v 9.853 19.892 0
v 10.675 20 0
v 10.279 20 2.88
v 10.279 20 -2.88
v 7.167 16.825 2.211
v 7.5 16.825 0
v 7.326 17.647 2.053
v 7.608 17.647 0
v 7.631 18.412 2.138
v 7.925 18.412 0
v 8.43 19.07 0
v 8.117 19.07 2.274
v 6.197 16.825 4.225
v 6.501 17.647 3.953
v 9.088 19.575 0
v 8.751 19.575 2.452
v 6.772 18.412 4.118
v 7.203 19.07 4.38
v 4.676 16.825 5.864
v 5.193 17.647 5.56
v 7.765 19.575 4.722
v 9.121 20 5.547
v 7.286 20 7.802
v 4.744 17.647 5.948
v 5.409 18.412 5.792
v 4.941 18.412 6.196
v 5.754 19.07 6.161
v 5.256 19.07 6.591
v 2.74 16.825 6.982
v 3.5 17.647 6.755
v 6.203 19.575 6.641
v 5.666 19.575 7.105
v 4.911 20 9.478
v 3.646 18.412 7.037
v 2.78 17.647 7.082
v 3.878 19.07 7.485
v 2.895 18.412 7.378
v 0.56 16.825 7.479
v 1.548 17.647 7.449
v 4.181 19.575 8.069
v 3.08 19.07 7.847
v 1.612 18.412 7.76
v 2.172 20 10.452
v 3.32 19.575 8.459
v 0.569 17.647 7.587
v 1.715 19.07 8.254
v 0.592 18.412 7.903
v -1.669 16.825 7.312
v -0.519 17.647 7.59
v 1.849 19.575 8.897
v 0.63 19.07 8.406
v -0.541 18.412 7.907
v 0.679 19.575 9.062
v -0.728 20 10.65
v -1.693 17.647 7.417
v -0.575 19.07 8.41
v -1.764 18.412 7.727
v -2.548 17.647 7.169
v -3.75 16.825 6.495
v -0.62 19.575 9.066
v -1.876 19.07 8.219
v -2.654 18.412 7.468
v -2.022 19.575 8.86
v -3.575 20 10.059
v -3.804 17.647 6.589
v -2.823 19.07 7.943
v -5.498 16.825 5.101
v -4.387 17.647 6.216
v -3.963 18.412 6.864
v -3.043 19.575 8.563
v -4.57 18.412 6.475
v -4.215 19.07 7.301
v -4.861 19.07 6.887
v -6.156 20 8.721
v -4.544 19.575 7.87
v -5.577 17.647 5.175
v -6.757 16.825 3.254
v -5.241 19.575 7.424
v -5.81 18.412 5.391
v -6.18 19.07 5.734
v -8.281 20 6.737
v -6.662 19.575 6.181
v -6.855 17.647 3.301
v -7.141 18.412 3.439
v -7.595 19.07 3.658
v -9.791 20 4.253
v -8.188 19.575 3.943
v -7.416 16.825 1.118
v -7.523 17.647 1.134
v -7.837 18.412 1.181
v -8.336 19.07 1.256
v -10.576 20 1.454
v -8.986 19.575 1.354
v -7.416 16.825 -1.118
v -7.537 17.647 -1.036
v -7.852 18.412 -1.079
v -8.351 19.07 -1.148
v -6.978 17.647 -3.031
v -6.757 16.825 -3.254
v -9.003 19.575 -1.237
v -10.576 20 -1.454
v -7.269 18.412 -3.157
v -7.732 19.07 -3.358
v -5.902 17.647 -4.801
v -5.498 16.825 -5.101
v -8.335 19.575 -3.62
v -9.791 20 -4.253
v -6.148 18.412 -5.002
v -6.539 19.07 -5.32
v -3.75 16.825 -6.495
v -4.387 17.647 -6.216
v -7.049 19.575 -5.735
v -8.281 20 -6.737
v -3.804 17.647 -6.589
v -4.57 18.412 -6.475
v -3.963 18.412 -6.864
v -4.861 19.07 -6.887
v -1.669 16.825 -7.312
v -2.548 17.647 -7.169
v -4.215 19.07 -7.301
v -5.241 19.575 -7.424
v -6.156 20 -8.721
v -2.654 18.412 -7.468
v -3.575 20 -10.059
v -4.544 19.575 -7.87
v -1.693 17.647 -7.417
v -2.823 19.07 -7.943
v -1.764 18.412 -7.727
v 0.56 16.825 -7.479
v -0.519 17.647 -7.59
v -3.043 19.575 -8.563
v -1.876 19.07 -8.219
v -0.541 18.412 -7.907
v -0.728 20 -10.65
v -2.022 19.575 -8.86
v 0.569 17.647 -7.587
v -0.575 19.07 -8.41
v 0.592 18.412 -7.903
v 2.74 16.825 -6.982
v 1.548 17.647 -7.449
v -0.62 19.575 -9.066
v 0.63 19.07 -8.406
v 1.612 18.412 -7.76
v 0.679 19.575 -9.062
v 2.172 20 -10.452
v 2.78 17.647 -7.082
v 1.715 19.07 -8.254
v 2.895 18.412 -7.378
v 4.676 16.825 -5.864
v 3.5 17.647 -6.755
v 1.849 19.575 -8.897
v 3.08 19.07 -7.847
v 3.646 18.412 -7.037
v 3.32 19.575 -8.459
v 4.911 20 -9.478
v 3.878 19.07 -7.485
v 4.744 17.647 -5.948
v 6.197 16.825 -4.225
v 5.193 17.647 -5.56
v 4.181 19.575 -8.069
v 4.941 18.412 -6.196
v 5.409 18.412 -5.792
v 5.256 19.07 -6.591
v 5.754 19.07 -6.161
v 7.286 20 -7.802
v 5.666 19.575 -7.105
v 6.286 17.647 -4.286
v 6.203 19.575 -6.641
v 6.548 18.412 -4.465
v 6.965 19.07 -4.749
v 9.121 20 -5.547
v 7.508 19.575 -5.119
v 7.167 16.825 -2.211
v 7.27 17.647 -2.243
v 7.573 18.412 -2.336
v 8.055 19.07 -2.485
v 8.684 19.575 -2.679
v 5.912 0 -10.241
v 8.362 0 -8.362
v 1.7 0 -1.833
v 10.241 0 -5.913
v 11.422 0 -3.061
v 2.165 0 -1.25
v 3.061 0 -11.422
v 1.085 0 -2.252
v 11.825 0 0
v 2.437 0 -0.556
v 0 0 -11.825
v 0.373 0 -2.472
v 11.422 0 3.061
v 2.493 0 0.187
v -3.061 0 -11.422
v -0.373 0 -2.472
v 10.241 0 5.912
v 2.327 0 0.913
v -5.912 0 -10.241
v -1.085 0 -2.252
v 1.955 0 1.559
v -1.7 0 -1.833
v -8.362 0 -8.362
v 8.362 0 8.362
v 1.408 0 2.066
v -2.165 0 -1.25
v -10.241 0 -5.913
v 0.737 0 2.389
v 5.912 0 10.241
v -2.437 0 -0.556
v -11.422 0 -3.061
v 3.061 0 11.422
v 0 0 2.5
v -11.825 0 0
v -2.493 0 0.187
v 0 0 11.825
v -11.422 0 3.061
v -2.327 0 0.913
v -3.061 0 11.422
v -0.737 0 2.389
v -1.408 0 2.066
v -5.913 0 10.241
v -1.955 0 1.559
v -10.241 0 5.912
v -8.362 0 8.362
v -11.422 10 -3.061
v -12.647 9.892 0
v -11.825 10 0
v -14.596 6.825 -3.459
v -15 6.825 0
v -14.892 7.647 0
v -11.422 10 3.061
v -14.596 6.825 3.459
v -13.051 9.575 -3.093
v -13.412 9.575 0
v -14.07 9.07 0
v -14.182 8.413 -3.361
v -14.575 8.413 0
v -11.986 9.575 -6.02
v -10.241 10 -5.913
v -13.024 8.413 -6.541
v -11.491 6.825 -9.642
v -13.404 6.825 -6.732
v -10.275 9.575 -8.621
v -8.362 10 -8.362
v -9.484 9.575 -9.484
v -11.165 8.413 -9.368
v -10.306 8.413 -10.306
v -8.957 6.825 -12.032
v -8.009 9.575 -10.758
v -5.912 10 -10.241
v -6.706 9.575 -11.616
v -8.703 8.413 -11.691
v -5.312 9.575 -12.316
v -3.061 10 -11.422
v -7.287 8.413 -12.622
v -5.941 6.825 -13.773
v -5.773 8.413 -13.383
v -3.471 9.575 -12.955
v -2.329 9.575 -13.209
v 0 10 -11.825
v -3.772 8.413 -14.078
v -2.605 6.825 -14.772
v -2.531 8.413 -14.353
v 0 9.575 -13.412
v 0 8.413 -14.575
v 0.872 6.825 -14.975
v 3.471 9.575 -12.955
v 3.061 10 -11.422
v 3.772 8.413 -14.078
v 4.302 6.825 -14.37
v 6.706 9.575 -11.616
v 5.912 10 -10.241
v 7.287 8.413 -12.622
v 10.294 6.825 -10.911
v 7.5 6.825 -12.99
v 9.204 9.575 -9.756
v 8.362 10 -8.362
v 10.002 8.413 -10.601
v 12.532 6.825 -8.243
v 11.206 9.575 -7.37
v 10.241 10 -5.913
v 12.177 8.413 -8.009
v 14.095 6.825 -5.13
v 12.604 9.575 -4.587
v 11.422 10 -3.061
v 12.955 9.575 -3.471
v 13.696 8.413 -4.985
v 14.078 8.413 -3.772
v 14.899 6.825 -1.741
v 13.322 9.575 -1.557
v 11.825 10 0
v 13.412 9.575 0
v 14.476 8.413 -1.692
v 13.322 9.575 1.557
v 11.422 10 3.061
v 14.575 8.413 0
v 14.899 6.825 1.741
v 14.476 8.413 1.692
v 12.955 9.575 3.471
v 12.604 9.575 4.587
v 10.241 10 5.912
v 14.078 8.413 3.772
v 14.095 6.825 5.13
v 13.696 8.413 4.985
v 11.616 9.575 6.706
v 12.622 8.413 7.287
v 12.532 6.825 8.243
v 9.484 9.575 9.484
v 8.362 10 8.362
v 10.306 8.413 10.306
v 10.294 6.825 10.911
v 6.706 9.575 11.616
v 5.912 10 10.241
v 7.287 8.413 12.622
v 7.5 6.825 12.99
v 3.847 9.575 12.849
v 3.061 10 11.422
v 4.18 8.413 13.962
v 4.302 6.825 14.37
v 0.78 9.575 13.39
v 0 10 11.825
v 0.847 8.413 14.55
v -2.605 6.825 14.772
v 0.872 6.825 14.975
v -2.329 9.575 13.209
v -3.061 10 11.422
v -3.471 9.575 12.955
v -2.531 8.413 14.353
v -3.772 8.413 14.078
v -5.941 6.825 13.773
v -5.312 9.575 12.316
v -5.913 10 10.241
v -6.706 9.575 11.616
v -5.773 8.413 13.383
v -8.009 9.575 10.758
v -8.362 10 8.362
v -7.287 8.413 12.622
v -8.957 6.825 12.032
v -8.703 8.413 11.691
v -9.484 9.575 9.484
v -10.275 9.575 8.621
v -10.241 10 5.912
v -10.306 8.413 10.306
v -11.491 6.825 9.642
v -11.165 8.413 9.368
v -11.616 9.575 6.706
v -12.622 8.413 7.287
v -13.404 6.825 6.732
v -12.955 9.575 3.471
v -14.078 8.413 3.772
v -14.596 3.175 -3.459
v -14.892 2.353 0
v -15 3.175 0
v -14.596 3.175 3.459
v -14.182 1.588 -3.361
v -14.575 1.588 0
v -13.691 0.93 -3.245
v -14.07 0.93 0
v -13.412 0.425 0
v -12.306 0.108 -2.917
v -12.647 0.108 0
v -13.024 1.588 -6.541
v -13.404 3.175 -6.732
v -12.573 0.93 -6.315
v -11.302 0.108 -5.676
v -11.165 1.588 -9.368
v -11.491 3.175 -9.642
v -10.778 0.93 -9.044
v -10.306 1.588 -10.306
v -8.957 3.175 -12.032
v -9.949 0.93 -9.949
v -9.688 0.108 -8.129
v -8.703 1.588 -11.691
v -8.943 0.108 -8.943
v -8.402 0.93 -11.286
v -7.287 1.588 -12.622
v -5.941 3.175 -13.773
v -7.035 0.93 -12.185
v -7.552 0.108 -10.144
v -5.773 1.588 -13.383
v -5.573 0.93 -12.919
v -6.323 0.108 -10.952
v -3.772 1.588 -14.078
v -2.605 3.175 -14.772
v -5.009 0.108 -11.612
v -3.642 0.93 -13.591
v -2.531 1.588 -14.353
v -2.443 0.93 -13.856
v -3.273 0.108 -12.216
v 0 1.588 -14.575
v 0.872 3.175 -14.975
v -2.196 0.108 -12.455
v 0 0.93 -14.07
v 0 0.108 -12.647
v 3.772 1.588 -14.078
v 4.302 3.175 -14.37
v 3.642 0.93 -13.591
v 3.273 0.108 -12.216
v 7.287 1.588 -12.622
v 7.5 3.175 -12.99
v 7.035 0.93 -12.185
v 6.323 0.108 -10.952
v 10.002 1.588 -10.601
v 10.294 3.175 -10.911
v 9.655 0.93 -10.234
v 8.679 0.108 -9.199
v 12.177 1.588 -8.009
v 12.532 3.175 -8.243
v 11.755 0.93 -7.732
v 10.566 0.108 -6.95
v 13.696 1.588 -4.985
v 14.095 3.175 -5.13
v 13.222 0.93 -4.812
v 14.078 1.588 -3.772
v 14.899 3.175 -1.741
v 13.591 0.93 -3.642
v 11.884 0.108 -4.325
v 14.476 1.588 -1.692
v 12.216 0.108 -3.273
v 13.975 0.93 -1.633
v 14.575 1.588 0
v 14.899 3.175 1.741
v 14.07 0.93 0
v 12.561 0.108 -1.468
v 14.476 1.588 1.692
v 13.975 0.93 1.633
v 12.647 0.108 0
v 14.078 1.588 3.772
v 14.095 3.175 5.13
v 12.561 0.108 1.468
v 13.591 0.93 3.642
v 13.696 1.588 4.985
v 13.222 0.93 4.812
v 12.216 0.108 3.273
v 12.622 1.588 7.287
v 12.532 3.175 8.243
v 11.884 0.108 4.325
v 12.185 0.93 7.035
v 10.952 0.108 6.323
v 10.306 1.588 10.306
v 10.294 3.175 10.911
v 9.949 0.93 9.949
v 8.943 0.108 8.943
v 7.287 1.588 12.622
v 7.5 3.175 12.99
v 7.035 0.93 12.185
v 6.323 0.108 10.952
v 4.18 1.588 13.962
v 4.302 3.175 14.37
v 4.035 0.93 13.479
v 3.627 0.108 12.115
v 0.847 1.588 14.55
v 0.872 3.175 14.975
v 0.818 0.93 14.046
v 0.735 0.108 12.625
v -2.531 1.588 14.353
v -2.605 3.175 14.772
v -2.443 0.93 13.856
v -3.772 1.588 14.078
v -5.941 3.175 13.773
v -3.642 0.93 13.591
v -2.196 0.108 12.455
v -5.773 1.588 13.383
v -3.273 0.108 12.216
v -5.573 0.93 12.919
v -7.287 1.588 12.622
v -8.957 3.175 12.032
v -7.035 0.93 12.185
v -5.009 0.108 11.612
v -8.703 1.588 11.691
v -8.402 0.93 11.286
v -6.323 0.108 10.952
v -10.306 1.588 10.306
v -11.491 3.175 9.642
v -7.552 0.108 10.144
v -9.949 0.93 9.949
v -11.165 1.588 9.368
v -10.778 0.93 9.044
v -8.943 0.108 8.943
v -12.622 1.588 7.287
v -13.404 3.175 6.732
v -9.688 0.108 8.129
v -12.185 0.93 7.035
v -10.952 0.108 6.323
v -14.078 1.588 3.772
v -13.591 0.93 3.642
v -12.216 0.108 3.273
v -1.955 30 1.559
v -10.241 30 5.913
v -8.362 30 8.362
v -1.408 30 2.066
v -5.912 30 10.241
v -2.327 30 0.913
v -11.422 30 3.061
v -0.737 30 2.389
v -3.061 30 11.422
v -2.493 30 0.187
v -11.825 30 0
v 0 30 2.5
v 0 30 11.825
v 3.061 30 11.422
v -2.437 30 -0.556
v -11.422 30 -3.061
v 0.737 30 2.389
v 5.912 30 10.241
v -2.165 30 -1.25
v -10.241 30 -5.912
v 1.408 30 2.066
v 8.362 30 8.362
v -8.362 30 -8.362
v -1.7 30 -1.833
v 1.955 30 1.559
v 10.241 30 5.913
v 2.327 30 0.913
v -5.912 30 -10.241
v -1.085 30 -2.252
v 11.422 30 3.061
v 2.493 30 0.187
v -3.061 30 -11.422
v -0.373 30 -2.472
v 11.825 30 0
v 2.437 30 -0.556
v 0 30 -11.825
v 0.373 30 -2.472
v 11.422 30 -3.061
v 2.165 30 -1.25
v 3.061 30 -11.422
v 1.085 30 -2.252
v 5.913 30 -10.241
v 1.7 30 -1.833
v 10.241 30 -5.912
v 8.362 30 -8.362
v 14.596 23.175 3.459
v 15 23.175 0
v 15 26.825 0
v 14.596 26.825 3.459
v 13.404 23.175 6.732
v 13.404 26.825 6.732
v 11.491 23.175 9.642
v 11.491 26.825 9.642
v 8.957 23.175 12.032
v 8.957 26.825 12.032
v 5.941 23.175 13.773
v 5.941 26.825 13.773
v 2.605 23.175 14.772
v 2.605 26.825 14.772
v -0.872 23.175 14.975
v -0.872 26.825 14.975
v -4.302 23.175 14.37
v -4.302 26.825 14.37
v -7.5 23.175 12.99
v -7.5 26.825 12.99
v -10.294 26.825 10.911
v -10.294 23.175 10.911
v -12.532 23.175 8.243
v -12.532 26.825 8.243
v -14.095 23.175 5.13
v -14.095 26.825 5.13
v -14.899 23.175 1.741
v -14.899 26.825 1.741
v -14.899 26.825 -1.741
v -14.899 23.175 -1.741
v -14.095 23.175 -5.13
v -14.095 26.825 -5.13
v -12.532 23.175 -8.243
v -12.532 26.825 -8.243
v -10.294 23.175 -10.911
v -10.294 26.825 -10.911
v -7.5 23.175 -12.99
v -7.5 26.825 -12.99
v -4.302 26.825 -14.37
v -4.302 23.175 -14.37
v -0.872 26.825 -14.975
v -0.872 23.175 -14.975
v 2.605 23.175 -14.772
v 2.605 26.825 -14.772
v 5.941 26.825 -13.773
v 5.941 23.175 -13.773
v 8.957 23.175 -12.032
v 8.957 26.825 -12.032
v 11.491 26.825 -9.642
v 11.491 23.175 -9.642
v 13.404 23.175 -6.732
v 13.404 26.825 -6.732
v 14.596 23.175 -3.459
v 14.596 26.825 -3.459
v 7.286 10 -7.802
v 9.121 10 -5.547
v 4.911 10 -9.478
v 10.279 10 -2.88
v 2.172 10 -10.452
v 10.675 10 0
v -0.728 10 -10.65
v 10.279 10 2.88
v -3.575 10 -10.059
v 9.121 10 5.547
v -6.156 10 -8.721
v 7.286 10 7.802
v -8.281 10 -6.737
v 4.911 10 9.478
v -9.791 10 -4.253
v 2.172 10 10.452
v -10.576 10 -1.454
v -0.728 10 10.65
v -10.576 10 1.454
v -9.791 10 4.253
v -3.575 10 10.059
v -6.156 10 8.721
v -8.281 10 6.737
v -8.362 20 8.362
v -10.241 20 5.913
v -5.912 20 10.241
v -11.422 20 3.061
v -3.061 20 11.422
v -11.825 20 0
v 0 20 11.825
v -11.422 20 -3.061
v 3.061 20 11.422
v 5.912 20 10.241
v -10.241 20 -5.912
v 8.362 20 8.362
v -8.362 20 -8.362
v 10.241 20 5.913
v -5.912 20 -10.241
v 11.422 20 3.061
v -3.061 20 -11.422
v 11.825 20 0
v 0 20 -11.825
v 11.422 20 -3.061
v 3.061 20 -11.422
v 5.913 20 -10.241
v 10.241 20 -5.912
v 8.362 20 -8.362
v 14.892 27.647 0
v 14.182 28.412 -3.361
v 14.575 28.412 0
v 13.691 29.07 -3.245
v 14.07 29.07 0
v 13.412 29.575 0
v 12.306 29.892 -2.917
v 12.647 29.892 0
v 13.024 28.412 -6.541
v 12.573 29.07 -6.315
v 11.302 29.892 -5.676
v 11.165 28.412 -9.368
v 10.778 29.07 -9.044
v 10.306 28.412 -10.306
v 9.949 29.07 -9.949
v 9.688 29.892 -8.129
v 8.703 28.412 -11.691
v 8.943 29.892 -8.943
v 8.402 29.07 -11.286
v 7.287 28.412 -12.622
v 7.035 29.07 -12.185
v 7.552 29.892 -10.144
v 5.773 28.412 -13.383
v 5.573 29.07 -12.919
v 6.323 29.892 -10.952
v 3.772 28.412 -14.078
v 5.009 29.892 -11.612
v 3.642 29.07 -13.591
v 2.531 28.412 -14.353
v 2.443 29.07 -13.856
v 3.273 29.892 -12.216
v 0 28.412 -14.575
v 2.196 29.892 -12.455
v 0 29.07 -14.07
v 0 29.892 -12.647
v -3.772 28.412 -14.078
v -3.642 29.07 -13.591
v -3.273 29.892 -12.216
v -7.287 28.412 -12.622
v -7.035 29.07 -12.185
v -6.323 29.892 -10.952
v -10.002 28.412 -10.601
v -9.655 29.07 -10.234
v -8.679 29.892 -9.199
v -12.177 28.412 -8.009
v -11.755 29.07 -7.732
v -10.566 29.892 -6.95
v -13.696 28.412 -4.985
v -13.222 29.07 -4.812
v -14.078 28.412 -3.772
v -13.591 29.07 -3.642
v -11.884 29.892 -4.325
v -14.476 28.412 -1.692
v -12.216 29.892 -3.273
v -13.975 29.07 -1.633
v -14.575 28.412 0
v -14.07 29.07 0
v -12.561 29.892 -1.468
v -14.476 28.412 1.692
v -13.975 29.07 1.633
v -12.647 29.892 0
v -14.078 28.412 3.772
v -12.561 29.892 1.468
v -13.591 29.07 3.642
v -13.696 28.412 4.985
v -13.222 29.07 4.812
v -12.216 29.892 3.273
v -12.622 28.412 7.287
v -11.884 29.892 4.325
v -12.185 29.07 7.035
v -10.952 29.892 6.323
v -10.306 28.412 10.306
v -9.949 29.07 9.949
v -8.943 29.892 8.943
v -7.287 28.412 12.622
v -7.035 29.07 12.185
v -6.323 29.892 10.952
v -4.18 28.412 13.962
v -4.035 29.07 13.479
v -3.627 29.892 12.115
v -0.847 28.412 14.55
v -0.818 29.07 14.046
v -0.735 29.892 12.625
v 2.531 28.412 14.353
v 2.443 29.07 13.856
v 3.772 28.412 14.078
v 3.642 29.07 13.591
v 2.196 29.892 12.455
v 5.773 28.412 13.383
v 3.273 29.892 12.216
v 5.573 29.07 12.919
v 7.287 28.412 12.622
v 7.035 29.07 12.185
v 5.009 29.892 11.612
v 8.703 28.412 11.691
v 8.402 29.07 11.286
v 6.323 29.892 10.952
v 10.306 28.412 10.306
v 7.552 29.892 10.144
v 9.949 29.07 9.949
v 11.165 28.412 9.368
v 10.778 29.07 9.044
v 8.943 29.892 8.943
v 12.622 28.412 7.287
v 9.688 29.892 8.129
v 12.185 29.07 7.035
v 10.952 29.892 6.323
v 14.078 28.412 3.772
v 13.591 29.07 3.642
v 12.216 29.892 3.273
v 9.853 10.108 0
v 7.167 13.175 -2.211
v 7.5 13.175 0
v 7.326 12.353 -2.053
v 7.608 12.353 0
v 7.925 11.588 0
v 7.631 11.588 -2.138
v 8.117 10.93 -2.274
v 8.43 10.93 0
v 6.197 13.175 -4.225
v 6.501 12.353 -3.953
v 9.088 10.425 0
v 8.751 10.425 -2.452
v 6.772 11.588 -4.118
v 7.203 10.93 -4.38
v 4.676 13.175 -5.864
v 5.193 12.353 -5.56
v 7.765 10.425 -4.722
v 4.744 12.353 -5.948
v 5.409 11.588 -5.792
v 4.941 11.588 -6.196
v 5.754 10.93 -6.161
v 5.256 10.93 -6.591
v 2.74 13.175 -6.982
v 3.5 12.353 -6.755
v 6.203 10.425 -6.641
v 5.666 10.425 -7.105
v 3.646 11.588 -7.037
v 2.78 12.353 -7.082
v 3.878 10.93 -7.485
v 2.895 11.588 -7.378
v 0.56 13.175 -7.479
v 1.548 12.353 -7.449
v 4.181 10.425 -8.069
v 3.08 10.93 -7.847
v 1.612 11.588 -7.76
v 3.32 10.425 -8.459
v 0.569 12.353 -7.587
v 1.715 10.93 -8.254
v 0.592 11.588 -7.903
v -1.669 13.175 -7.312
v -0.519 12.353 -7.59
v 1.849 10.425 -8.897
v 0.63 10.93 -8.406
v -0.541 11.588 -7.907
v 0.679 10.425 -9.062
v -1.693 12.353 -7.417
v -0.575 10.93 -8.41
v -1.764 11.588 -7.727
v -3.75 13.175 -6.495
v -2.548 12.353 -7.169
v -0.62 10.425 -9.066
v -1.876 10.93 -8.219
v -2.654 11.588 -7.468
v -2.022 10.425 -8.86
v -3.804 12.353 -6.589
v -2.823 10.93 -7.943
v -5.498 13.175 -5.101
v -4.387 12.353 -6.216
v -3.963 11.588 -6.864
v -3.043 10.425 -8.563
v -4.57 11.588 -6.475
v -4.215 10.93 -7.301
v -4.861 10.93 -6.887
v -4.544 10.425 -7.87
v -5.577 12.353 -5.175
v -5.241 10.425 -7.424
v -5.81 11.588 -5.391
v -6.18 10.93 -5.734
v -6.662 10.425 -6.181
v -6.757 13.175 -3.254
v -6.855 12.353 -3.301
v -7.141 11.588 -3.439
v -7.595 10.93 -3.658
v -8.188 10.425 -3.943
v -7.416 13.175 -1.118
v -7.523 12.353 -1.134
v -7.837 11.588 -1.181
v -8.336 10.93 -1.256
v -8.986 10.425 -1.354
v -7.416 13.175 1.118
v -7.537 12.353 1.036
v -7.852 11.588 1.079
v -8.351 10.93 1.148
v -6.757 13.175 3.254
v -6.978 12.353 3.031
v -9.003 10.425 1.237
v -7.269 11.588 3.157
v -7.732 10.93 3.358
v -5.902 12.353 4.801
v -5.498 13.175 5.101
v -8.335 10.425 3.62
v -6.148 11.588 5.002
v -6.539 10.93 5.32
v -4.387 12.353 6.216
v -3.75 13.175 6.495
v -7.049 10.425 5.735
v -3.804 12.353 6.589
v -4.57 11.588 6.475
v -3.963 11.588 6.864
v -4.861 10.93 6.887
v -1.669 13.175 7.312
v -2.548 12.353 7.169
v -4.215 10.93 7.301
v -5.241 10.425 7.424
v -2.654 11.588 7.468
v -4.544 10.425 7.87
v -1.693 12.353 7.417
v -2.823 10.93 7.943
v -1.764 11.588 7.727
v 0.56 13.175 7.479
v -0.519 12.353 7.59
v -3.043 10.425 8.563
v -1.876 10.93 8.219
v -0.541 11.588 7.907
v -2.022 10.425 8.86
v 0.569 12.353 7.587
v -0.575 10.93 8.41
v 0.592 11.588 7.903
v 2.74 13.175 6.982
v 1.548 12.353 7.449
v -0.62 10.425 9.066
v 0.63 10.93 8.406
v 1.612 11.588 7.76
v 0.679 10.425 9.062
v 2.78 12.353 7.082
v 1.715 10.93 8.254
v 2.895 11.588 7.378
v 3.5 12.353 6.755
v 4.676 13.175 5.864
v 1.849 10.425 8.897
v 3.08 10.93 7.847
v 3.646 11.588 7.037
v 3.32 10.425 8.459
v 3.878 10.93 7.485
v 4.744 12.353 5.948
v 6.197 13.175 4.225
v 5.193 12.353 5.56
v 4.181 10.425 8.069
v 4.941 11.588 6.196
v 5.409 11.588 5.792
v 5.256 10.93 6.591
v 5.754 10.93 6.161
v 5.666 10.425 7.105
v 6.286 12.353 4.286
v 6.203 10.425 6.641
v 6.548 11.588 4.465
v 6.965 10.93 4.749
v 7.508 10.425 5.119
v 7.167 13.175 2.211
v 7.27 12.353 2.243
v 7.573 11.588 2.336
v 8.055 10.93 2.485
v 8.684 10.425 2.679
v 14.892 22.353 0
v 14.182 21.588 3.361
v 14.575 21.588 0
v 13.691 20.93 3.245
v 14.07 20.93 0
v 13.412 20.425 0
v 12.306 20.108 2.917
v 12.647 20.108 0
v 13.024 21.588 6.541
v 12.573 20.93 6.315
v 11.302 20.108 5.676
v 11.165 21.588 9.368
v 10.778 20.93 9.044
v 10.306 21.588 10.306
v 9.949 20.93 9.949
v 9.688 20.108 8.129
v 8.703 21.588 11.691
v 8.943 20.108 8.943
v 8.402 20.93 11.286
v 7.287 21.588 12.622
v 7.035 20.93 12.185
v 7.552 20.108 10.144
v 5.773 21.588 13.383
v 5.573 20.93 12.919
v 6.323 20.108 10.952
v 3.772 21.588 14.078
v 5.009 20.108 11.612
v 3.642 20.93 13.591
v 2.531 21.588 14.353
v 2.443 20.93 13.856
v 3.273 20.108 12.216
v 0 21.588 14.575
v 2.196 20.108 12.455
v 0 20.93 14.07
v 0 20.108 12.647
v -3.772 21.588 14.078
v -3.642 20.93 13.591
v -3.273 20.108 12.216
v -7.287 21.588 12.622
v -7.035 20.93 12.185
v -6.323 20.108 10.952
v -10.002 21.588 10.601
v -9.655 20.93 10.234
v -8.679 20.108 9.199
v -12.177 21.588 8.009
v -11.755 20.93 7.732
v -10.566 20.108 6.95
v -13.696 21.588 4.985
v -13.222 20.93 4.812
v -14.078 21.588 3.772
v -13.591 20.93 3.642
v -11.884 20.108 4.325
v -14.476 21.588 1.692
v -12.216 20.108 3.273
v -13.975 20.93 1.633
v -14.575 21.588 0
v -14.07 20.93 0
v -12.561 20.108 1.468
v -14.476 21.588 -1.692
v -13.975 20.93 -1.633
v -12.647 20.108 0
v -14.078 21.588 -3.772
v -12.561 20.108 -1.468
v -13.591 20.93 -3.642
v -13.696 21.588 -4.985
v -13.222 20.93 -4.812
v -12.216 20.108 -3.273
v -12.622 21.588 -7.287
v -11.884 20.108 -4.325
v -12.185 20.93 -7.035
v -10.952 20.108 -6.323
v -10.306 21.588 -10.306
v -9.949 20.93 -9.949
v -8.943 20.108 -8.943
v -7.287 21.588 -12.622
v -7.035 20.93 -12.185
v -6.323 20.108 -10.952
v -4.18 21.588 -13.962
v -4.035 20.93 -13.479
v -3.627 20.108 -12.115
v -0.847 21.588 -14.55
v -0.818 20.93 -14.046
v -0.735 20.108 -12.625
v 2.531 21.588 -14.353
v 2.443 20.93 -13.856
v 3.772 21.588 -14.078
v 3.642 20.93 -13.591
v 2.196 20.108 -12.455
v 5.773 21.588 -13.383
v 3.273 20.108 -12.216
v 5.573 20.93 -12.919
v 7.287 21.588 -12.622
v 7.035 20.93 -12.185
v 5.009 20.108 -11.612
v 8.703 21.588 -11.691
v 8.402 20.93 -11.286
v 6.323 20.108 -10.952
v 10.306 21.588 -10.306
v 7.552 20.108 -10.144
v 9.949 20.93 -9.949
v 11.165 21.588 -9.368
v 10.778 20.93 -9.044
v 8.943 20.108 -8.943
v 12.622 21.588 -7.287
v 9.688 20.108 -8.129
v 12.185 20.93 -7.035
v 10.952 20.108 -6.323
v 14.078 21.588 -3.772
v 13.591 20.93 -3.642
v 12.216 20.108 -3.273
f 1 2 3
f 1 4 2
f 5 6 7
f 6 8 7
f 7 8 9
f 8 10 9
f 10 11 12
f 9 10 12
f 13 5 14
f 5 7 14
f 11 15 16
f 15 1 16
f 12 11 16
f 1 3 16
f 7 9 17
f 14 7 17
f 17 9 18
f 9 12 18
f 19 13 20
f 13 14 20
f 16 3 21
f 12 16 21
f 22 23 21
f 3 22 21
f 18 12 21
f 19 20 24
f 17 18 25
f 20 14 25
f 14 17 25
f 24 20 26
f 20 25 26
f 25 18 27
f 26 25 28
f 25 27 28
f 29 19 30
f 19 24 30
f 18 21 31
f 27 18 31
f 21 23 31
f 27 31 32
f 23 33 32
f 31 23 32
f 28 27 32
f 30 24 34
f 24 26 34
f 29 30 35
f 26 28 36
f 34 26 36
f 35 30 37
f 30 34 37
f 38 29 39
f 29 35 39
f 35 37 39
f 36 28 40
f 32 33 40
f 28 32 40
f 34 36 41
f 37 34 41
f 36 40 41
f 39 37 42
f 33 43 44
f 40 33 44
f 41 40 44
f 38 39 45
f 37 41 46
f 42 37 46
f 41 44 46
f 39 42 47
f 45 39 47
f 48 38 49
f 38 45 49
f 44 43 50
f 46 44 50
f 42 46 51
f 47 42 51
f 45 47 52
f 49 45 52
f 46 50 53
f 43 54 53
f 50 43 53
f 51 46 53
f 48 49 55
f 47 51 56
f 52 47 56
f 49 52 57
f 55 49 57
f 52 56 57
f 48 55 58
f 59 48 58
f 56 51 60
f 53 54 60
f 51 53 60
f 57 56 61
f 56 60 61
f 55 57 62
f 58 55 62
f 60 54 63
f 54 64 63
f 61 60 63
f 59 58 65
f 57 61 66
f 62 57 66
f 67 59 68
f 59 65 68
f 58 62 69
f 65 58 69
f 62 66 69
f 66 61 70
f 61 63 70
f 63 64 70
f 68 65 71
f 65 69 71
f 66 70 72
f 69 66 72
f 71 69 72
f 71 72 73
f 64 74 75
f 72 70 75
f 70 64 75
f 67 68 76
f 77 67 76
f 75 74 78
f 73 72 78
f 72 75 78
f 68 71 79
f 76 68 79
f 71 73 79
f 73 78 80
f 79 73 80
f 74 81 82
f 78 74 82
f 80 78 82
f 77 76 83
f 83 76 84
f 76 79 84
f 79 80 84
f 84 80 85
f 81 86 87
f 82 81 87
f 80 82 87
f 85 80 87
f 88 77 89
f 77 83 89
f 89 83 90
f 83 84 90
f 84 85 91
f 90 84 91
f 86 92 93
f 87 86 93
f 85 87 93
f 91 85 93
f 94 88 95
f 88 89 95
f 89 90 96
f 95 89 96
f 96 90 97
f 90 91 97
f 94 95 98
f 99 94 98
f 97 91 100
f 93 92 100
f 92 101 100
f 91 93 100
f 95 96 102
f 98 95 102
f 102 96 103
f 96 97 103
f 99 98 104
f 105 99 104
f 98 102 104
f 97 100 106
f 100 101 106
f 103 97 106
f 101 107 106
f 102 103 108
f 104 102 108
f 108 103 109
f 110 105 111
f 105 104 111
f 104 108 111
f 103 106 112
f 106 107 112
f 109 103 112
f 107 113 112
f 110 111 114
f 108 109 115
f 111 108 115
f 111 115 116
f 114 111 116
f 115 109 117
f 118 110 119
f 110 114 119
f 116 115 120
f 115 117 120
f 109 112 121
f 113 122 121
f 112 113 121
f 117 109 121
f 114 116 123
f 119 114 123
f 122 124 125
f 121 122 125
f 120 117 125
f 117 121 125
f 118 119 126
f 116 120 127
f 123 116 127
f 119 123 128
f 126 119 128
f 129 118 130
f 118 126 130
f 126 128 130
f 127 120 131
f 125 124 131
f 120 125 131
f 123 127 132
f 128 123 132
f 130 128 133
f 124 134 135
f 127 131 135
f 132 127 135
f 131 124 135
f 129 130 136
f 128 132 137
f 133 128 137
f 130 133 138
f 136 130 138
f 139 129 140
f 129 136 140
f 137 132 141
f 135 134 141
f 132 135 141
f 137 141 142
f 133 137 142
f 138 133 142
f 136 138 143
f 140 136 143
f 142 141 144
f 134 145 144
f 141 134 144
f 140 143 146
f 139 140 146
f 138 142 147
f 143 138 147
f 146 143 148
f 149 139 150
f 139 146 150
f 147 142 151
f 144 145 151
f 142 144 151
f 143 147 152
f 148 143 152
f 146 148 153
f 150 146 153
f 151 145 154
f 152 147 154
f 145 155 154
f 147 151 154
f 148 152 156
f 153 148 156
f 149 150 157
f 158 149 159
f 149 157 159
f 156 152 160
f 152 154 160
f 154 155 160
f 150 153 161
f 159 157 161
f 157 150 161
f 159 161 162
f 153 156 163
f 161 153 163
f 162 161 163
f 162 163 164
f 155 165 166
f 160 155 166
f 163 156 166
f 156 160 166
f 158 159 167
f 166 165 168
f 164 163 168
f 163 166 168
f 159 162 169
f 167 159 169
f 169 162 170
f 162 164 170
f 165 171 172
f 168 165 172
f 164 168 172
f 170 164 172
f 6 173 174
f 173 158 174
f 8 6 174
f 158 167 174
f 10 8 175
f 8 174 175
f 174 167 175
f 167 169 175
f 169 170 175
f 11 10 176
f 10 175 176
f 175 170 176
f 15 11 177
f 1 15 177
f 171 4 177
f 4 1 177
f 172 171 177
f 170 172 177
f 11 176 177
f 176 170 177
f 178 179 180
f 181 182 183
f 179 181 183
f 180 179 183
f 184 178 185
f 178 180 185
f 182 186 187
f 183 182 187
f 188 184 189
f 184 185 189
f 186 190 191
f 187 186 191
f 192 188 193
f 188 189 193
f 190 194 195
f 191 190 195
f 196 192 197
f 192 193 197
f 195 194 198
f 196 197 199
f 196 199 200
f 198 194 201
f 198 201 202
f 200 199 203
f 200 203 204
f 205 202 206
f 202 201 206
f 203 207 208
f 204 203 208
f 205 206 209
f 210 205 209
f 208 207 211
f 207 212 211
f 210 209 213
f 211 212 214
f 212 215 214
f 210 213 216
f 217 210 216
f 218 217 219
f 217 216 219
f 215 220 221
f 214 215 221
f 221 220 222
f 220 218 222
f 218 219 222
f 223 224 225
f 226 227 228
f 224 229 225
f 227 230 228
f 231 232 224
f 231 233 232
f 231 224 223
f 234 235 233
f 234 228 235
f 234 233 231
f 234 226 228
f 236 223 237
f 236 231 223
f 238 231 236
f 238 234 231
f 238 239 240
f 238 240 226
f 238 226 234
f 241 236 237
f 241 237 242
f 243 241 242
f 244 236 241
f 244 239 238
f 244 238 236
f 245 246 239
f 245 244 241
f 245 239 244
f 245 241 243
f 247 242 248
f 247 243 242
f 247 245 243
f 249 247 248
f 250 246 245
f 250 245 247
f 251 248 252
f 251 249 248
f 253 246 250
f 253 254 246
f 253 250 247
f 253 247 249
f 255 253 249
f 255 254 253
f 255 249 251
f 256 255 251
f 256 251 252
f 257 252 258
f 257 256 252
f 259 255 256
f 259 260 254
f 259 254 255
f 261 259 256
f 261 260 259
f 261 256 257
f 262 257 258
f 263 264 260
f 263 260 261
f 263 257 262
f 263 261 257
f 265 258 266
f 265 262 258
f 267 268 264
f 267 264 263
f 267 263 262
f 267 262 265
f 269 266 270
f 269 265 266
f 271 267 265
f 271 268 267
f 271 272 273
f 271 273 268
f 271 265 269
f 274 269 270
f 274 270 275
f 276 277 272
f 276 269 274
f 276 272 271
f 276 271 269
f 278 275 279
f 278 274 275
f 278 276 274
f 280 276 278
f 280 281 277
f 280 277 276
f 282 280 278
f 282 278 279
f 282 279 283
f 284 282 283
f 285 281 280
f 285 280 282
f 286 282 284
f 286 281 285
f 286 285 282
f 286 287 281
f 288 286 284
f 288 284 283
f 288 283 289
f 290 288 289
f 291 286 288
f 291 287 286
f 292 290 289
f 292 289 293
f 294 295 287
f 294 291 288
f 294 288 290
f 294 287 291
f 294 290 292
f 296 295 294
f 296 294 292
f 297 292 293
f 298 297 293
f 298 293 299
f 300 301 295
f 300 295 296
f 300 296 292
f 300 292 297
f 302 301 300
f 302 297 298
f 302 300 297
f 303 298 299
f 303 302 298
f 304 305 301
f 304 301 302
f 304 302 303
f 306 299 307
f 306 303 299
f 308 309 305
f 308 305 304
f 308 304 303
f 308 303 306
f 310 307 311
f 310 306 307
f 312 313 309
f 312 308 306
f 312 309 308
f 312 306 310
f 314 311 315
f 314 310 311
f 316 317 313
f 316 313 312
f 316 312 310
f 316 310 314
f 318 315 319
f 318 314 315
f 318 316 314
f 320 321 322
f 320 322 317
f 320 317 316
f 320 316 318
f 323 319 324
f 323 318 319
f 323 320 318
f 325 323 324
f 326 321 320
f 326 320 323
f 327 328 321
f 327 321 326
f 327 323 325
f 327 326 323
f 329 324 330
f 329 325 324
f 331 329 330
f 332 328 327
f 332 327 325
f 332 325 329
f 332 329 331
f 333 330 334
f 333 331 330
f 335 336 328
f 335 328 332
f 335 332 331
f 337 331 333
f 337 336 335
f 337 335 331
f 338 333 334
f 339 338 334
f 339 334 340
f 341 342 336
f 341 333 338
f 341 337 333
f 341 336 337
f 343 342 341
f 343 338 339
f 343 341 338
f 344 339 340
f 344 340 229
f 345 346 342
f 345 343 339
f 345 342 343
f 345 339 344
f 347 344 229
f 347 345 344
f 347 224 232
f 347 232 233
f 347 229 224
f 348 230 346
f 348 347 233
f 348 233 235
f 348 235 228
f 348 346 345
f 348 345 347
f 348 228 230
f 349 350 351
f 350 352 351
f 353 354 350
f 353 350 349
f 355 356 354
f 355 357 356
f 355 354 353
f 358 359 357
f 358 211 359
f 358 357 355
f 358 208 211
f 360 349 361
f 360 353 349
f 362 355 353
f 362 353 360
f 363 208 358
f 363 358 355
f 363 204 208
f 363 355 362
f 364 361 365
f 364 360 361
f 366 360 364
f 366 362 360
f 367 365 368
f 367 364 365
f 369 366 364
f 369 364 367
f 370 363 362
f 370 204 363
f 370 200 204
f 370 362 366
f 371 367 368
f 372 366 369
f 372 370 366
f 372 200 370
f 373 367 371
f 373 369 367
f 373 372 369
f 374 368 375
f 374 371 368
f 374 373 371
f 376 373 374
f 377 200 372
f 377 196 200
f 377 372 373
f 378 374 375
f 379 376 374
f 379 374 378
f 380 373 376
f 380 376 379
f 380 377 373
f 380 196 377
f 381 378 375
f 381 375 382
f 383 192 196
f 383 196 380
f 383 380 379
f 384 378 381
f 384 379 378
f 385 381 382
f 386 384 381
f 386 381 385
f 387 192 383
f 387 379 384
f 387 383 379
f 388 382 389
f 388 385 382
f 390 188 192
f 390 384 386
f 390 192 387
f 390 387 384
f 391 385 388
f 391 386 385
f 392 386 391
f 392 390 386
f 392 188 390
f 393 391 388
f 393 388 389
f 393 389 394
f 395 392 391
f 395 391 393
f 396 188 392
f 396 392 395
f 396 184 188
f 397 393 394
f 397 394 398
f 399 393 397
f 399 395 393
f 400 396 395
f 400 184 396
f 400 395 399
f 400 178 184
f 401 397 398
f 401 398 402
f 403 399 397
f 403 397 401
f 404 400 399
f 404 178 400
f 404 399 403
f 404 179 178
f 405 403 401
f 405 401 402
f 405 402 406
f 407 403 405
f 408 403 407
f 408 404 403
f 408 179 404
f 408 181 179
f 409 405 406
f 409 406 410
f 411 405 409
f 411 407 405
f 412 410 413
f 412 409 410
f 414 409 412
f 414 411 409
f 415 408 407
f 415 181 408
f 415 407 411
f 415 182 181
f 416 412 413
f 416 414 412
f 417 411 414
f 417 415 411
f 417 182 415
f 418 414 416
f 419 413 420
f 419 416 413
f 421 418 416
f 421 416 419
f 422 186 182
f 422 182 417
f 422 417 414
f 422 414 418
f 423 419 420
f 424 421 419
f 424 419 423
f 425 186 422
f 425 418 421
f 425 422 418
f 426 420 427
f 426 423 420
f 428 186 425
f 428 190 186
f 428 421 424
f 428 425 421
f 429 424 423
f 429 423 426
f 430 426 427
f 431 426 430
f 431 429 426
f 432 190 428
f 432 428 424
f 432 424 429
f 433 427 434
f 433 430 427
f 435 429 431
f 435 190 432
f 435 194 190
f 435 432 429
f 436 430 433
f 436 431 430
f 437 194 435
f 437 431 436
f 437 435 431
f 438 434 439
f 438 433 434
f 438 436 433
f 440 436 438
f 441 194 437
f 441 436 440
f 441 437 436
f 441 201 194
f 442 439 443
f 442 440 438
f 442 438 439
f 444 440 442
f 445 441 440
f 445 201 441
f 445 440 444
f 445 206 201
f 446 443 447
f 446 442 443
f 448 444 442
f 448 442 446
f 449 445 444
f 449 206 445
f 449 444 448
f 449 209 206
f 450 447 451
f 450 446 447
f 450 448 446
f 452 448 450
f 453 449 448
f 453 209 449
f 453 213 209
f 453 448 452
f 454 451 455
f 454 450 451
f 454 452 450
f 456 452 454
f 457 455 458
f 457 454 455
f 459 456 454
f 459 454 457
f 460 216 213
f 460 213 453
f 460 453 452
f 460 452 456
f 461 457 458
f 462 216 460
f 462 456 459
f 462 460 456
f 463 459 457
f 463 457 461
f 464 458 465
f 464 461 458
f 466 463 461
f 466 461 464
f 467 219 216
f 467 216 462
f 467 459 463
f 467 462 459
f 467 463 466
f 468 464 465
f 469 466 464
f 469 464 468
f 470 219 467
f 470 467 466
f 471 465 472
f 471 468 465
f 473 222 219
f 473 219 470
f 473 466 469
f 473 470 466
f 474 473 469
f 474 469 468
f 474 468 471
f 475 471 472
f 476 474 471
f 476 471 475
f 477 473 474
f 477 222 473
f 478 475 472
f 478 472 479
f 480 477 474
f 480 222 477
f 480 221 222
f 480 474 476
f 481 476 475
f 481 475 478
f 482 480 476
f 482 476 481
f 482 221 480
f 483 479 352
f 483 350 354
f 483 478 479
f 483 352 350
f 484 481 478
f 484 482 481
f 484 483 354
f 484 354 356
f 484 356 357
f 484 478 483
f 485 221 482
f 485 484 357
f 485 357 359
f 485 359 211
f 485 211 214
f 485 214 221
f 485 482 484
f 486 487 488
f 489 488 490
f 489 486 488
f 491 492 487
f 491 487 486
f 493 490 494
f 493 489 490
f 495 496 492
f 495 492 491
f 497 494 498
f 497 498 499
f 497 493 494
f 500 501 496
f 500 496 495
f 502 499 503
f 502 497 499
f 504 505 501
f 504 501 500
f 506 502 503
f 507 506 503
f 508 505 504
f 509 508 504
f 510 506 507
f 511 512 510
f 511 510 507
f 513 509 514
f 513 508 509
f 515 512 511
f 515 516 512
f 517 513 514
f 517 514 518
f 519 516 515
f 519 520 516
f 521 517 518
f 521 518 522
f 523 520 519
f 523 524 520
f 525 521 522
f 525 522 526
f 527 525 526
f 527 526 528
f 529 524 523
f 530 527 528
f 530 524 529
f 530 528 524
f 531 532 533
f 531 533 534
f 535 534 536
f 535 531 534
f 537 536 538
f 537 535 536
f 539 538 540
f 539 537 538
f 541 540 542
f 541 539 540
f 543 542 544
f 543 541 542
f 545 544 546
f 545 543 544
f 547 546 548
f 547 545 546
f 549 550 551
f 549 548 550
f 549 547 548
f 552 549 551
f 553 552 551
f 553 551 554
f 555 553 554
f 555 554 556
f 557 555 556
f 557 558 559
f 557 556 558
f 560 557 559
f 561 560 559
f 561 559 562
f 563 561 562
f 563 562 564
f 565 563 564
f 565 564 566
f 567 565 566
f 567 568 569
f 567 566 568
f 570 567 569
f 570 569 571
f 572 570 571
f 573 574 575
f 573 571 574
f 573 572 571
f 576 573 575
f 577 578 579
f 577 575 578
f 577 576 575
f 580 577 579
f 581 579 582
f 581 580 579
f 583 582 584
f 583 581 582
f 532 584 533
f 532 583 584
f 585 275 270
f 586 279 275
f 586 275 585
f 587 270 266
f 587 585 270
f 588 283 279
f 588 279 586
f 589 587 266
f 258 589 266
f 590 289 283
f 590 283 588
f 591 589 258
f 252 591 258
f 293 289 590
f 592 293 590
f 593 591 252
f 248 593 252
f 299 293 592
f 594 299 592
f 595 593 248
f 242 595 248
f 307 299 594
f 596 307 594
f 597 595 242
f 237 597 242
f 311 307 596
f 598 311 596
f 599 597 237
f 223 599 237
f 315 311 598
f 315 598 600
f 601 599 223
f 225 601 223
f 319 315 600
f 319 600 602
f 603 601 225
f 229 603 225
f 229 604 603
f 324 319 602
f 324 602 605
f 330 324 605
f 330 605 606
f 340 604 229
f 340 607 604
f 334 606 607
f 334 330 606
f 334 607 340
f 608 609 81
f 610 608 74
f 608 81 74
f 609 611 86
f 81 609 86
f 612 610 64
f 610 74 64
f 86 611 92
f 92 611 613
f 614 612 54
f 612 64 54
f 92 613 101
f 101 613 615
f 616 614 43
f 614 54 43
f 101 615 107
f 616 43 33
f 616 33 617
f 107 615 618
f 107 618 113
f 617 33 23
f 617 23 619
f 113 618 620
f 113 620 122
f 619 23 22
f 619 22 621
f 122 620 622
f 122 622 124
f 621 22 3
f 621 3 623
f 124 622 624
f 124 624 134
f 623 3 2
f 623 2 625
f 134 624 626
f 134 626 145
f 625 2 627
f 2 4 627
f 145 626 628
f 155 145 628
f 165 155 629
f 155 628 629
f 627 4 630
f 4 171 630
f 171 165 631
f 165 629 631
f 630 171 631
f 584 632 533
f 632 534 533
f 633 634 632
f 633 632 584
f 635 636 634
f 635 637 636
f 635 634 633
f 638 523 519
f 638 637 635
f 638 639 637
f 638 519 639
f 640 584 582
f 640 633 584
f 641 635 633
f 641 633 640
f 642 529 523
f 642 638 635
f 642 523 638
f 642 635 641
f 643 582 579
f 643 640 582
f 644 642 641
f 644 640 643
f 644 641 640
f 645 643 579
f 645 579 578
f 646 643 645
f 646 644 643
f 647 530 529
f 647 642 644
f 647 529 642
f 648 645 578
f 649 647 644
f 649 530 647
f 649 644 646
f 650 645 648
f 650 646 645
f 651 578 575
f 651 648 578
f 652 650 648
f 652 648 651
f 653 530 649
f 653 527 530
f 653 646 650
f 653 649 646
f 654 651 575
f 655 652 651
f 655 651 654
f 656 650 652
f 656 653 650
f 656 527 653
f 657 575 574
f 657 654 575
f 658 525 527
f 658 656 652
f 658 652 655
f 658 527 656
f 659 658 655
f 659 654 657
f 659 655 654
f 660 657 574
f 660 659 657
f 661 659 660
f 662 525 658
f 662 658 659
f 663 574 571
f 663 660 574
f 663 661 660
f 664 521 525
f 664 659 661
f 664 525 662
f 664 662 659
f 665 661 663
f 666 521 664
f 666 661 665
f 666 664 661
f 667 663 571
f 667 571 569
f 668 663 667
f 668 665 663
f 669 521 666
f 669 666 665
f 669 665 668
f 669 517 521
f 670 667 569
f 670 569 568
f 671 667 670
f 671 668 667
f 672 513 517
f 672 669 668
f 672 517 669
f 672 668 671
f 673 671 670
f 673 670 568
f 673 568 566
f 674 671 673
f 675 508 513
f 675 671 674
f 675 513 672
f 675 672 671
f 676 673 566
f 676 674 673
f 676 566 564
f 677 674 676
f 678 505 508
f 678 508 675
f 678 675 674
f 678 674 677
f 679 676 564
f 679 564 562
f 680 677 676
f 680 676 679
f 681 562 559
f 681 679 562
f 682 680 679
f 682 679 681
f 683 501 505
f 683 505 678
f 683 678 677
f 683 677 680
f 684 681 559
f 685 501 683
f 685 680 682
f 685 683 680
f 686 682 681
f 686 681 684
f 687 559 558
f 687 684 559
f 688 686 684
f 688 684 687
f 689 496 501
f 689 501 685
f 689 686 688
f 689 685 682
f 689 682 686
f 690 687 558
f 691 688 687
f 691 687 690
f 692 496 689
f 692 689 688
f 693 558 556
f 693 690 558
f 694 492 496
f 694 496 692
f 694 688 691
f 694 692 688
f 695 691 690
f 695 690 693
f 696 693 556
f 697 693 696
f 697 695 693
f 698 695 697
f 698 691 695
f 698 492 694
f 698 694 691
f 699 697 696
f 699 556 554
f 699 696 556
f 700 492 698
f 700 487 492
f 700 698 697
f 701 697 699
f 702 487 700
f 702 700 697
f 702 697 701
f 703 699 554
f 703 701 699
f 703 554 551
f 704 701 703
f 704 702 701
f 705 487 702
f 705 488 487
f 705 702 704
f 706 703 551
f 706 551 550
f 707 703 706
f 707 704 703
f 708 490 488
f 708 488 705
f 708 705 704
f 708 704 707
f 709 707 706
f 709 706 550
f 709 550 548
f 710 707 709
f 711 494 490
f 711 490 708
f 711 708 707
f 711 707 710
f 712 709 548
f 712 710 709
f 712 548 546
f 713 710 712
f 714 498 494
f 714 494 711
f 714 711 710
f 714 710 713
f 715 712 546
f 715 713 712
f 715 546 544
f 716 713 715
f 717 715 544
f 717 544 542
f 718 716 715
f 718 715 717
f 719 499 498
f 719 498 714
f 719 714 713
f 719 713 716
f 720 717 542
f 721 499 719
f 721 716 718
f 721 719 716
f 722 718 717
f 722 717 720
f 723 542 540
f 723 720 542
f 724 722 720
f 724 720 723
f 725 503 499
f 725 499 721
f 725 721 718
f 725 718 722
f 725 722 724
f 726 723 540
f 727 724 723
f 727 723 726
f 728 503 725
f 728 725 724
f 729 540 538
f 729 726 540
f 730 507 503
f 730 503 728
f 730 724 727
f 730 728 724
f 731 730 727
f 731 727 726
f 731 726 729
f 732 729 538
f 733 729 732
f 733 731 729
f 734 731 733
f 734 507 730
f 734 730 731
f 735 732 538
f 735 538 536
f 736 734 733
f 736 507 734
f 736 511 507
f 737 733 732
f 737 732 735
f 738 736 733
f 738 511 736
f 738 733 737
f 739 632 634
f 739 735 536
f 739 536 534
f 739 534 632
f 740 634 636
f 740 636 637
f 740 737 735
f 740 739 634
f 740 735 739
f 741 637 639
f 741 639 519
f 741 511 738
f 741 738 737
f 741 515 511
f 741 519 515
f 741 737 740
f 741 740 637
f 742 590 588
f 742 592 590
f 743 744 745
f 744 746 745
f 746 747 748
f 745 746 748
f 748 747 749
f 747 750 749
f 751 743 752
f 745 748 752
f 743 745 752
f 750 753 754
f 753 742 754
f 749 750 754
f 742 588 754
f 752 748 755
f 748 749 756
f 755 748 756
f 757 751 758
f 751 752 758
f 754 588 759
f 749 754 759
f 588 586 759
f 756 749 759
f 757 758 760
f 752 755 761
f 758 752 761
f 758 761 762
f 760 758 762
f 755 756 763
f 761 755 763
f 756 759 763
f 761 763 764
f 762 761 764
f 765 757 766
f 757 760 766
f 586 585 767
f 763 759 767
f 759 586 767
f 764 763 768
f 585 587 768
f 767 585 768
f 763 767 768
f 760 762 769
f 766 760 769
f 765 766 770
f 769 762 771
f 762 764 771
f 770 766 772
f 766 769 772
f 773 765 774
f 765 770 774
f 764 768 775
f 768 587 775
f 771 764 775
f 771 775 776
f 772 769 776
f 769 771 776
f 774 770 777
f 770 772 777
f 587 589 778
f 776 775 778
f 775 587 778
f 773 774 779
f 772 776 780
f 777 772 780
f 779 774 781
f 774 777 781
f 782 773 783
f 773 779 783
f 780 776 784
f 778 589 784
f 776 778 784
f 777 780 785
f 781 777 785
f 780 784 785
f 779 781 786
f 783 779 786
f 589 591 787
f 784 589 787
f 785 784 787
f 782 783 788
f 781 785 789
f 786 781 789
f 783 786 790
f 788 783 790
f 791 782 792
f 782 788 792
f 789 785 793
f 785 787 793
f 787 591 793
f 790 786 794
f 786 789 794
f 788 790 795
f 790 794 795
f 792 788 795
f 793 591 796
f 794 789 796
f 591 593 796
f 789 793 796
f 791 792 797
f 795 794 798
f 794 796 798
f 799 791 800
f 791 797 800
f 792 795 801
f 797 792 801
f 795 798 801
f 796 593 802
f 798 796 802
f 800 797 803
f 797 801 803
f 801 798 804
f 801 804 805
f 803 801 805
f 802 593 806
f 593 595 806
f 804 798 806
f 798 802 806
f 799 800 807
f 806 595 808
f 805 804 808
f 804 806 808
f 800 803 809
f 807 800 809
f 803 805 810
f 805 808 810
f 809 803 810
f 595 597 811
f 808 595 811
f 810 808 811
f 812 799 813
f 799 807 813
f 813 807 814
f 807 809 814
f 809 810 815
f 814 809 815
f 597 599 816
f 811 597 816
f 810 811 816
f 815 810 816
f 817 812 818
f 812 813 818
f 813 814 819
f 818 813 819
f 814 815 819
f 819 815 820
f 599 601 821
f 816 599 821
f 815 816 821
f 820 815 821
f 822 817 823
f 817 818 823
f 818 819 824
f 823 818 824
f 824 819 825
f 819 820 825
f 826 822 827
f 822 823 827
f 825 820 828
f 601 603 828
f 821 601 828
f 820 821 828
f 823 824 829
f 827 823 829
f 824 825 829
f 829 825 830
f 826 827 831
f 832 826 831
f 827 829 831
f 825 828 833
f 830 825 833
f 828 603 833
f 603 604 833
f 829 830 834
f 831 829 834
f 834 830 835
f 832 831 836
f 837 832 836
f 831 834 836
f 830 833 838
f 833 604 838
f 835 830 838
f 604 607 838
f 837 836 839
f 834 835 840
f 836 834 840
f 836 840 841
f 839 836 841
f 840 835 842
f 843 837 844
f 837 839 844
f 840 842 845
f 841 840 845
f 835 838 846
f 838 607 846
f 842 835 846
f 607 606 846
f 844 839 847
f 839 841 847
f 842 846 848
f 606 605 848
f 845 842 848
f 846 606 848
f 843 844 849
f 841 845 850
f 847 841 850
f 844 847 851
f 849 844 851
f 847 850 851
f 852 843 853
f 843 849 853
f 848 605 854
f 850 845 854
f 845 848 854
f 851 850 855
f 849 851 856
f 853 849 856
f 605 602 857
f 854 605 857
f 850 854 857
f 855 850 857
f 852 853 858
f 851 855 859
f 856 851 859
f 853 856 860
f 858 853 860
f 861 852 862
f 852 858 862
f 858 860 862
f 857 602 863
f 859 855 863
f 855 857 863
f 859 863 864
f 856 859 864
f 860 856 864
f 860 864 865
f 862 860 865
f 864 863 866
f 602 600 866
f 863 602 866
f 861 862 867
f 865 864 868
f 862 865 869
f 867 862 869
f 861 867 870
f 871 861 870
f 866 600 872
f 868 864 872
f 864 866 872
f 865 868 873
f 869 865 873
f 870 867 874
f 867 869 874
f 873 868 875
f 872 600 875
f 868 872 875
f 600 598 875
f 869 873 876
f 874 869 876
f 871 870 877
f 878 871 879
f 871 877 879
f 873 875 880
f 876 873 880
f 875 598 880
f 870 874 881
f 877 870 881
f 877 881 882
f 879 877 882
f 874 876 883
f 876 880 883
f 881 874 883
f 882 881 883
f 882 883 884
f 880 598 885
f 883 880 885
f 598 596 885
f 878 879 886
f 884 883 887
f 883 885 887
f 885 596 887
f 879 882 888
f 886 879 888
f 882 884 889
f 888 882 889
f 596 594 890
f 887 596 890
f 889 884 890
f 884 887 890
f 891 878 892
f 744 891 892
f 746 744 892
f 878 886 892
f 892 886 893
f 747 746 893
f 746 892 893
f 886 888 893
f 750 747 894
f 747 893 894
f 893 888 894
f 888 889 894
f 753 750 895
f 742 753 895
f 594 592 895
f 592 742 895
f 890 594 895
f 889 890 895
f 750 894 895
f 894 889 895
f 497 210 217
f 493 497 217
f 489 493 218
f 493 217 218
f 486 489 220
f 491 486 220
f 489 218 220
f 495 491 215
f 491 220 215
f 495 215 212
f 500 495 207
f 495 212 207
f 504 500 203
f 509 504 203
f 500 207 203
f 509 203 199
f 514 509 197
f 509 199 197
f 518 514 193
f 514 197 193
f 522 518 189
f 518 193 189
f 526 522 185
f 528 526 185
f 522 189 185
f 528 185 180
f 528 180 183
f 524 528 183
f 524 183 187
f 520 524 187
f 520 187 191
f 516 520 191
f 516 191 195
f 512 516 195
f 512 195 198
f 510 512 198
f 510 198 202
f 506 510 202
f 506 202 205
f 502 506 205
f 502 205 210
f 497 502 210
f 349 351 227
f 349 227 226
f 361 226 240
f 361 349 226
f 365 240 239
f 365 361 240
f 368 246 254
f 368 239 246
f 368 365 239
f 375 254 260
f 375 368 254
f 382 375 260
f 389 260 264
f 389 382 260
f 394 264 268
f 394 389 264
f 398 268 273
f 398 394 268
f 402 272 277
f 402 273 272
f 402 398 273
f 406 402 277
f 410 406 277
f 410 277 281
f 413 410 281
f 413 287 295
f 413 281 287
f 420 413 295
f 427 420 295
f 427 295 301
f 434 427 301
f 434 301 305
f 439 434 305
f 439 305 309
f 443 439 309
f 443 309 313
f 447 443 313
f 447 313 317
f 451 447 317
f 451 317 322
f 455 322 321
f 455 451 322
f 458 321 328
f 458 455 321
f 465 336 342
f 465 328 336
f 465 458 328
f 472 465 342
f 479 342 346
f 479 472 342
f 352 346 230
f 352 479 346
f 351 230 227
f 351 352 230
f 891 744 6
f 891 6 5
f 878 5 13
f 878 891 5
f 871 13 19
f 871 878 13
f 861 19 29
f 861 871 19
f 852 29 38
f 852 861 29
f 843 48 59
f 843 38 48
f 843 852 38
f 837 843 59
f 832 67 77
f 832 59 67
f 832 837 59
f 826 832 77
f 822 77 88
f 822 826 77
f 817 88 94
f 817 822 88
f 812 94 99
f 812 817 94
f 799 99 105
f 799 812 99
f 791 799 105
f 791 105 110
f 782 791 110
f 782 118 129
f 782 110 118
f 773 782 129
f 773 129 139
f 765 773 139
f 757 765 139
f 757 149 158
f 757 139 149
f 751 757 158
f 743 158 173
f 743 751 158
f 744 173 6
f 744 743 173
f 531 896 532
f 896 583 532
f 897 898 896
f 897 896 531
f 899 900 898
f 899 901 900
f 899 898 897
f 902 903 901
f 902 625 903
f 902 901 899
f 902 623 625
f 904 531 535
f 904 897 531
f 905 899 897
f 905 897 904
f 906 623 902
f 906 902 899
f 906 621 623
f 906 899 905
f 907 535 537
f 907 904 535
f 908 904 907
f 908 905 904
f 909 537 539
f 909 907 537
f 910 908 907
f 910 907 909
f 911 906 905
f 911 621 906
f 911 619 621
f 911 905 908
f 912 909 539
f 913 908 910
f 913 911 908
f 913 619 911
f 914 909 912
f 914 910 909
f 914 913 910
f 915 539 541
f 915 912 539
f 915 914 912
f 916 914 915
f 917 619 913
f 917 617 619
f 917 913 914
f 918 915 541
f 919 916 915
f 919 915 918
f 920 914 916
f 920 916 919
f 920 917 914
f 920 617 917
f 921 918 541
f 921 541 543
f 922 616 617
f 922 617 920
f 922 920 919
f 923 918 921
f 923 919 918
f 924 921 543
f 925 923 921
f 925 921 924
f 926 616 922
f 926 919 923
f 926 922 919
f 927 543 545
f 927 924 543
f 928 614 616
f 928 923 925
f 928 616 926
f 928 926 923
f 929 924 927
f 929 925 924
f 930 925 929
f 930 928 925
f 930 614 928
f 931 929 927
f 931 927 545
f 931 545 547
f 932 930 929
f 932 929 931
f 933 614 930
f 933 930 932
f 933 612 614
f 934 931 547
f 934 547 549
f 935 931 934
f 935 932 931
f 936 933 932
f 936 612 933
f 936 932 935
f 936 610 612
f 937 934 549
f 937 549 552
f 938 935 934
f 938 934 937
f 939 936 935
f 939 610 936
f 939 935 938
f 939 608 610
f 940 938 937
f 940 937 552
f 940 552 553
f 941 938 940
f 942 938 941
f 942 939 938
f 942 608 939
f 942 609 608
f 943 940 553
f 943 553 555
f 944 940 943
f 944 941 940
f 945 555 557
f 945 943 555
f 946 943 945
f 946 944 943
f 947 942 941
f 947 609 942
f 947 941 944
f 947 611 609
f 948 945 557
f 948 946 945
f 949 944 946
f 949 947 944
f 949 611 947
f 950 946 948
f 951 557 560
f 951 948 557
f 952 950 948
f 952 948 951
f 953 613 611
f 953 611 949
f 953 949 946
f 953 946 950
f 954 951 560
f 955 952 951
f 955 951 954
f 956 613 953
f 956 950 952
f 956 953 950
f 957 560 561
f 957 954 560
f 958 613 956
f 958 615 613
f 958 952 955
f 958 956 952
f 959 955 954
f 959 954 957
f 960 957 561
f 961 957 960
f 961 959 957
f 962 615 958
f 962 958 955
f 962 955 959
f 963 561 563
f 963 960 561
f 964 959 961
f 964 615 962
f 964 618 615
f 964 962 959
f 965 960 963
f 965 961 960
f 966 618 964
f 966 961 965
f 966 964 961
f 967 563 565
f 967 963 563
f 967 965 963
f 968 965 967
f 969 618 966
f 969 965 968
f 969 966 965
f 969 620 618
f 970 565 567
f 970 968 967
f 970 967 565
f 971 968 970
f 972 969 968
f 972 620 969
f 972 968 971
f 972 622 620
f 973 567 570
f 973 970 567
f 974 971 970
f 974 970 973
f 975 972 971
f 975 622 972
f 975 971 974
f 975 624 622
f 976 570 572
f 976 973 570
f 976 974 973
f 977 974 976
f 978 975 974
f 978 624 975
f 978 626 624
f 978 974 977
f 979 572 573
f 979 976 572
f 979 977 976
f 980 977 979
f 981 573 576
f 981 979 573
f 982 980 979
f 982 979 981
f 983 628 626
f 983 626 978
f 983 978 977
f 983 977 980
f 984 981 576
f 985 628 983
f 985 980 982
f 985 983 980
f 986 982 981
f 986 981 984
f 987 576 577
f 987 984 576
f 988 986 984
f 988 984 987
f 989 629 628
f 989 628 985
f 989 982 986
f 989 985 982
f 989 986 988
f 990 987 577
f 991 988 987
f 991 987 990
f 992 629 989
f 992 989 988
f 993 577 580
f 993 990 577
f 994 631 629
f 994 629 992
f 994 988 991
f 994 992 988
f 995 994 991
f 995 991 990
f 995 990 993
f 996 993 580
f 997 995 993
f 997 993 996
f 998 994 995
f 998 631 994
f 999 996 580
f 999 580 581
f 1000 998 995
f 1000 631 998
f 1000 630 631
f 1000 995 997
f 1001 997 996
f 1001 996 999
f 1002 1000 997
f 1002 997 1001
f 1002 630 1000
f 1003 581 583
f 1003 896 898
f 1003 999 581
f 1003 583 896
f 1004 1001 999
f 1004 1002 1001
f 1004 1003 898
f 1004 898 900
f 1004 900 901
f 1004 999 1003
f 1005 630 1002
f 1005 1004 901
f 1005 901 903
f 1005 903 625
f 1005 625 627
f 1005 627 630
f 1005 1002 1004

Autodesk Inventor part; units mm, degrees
ref_plane "YZ Plane" through (0, 0, 0) normal (1, 0, 0) x (0, 1, 0)
ref_plane "XZ Plane" through (0, 0, 0) normal (0, 1, 0) x (-1, 0, 0)
ref_plane "XY Plane" through (0, 0, 0) normal (0, 0, 1) x (1, 0, 0)
sketch "Sketch1" plane through (0, 0, 0) normal (0, 1, 0) x (-1, 0, 0)
  circle A0 centre (0, 0) radius 15
  dimension "d0" = 30
extrude "Extrusion1" add sketch "Sketch1" along normal blind 10
sketch "Sketch2" plane through (0, 10, 0) normal (0, 1, 0) x (1, 0, 0)
  circle A0 centre (0, 0) radius 7.5
  dimension "d3" = 15
extrude "Extrusion2" add sketch "Sketch2" along normal blind 10
sketch "Sketch3" plane through (0, 20, 0) normal (0, 1, 0) x (1, 0, 0)
  circle A0 centre (0, 0) radius 15
  dimension "d6" = 30
extrude "Extrusion3" add sketch "Sketch3" along normal blind 10
fillet "Fillet1" radius 3.175 1 edges at (-15, 30, 0)
fillet "Fillet2" radius 3.175 1 edges at (-15, 20, 0)
fillet "Fillet3" radius 3.175 1 edges at (15, 10, 0)
fillet "Fillet4" radius 3.175 1 edges at (15, 0, 0)
fillet "Fillet5" radius 3.175 1 edges at (-7.5, 20, 0)
fillet "Fillet6" radius 3.175 1 edges at (-7.5, 10, 0)
hole "Hole1" at (0, 30, 0) direction (0, -1, 0) diameter 5 end through all
properties part number "awesome inventor thing" material "Rock Wool"
